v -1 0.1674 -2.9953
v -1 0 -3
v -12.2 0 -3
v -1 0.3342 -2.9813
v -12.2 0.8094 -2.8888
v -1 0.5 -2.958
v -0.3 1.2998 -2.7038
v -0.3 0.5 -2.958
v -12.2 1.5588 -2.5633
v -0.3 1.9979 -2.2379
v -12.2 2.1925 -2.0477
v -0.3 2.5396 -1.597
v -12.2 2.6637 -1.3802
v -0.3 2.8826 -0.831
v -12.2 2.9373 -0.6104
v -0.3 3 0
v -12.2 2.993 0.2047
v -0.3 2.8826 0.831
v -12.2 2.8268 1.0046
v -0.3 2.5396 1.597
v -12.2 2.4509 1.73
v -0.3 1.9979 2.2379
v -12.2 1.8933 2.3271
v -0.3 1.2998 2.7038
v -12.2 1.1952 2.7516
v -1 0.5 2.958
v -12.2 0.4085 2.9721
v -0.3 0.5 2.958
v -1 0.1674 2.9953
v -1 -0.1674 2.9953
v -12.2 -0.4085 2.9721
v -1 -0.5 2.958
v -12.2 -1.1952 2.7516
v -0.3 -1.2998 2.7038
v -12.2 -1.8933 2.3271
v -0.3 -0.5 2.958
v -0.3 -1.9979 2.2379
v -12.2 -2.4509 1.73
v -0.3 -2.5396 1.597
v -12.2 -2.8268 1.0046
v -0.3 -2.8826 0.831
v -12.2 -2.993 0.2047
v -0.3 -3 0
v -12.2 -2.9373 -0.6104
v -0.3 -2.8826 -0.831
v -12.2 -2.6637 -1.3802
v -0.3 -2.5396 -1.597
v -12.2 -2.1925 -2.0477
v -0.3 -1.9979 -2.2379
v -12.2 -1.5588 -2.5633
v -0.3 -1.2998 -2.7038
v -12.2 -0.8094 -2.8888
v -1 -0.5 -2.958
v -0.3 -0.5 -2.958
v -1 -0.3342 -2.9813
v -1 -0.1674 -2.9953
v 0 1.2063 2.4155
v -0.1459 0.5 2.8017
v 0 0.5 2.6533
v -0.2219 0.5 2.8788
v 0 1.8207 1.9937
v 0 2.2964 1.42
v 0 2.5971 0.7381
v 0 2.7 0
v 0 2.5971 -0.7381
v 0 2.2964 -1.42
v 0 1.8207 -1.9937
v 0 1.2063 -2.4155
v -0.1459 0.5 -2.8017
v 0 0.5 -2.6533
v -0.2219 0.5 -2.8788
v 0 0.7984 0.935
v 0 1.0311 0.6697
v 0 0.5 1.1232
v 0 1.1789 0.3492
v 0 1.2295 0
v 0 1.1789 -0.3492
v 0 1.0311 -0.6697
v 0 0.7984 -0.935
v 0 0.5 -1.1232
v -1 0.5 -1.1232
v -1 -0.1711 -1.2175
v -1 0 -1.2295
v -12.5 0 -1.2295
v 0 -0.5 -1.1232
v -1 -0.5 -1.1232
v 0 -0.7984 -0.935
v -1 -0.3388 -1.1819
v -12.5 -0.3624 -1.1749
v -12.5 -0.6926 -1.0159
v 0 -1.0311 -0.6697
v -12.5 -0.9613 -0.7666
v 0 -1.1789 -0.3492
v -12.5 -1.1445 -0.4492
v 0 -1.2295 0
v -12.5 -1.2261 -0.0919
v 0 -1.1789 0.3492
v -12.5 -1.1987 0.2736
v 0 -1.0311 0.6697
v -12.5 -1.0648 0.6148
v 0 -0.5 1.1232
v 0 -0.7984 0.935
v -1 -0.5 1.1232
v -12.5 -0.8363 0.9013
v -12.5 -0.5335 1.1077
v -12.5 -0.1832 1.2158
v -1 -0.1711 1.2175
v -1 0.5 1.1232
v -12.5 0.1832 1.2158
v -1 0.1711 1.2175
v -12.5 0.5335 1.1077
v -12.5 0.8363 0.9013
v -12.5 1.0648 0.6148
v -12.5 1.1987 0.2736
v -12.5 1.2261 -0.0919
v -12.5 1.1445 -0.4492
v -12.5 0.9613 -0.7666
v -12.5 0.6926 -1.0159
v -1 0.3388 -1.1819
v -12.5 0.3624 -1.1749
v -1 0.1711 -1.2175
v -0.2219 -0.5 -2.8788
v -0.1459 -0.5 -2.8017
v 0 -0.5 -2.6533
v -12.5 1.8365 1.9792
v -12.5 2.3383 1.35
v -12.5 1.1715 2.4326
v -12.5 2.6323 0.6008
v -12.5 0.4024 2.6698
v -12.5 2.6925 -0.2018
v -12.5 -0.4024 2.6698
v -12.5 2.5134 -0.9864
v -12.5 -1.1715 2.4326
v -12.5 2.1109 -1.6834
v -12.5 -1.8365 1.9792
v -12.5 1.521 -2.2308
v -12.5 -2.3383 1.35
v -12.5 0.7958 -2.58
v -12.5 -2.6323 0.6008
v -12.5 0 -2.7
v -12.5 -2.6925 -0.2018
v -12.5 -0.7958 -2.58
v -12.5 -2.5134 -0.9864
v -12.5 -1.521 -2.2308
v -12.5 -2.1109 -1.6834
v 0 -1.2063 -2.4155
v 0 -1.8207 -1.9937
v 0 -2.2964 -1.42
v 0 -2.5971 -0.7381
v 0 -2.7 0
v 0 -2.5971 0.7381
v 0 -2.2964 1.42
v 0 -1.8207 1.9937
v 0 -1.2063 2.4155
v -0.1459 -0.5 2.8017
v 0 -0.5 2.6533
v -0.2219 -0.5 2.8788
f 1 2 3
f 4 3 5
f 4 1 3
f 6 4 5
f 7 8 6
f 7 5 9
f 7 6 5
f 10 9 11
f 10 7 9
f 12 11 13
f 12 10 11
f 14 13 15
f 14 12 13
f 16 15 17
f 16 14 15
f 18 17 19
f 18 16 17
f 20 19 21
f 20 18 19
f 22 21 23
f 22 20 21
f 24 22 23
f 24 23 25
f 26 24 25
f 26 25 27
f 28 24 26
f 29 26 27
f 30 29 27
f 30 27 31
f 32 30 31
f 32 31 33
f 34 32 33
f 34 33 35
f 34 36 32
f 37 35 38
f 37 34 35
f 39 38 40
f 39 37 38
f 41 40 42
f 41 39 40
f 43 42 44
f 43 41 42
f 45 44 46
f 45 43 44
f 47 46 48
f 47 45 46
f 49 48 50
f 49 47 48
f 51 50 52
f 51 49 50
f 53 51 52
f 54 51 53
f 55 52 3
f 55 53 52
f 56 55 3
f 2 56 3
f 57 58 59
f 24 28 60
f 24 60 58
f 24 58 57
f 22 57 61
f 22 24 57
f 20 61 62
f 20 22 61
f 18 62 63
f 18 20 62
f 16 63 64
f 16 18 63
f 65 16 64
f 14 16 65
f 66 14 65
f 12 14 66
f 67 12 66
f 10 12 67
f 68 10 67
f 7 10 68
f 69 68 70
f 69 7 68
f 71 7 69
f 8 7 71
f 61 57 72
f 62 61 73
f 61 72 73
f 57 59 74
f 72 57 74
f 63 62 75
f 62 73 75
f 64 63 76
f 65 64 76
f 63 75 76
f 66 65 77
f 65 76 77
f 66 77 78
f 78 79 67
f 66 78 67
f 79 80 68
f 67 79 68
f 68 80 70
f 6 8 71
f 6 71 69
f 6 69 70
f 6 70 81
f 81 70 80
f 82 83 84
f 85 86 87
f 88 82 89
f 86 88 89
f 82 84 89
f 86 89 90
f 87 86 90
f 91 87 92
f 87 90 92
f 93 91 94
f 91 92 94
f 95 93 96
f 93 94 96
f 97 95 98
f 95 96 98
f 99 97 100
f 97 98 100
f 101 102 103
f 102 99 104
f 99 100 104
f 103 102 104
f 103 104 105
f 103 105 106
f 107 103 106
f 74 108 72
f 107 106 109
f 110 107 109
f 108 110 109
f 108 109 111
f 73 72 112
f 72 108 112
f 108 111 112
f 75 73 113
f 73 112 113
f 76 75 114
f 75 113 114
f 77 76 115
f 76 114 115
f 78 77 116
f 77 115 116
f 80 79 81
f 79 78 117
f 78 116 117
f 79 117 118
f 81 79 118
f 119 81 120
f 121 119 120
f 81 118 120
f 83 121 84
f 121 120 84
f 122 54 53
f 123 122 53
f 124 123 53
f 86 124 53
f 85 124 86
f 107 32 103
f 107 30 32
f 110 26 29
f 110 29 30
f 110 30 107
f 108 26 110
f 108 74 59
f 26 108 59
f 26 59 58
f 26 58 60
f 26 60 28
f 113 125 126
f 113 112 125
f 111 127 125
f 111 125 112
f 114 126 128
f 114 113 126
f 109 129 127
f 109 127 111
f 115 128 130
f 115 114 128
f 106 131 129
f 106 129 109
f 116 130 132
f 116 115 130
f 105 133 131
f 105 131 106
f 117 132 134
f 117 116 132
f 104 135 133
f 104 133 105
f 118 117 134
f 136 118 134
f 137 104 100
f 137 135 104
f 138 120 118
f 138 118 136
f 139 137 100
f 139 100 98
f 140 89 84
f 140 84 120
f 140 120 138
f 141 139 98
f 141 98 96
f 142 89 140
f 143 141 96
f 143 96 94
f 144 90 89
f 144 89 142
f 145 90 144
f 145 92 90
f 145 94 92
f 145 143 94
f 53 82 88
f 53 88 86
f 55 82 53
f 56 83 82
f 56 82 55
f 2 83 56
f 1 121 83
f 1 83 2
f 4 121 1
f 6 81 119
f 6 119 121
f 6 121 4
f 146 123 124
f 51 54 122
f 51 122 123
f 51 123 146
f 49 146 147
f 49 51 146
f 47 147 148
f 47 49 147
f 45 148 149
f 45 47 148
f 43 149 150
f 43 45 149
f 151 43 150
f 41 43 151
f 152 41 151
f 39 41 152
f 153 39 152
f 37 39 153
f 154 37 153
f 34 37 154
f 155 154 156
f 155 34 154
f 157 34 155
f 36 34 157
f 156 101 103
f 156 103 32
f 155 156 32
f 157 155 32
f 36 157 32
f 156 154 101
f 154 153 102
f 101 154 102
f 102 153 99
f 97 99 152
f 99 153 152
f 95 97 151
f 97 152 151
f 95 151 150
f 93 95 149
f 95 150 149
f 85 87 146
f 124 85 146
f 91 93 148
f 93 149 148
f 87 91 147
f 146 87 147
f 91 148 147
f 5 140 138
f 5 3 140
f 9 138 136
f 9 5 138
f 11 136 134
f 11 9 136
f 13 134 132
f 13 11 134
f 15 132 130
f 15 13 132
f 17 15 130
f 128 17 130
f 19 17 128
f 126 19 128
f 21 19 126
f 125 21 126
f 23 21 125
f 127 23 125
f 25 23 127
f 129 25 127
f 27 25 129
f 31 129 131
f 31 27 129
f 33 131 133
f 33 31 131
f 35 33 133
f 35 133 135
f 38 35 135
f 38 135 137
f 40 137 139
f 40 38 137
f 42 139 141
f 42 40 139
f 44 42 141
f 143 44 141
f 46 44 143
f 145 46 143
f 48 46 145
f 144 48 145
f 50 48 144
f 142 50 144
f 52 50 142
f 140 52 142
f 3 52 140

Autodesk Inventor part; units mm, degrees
ref_plane "YZ Plane" through (0, 0, 0) normal (1, 0, 0) x (0, 1, 0)
ref_plane "XZ Plane" through (0, 0, 0) normal (0, 1, 0) x (-1, 0, 0)
ref_plane "XY Plane" through (0, 0, 0) normal (0, 0, 1) x (1, 0, 0)
sketch "スケッチ1" plane through (0, 0, 0) normal (0, 1, 0) x (-1, 0, 0)
  line L0 (0, 0) -> (12.5, 0)
  line L1 (12.5, 0) -> (12.5, -3)
  line L2 (12.5, -3) -> (0, -3)
  line L3 (0, -3) -> (0, 0)
  dimension "d0" = 12.5
  dimension "d1" = 3
revolve "回転1" add sketch "スケッチ1" angle 360 about axis through (0, 0, 0) along (-1, 0, 0)
sketch "スケッチ2" plane through (0, 0, 0) normal (1, 0, 0) x (0, 0, -1)
  point P0 (0, 0)
  point P1 (0, 0)
hole "穴1" at (0, 0, 0) direction (-1, 0, 0) diameter 2.459 end through all thread size "M3x0.5" class "6H" standard "ANSI Metric M Profile"
sketch "スケッチ3" plane through (0, 0, 0) normal (1, 0, 0) x (0, 0, -1)
  circle A0 centre (0, 0) radius 3 projected
  line L0 (3, 0) -> (-3, 0)
  line L1 (3, -0.5) -> (-3, -0.5)
  line L2 (3, 0.5) -> (-3, 0.5)
  line L3 (3, 0.5) -> (3, -0.5)
  line L4 (-3, 0.5) -> (-3, -0.5)
  point P0 (-2.958, -0.5)
  point P1 (2.958, -0.5)
  point P2 (2.958, 0.5)
  point P3 (-2.958, 0.5)
  dimension "d10" = 0.5
extrude "押し出し1" cut sketch "スケッチ3" against normal blind 1 contours L0 A0 L2 | A0 L1 L0
chamfer "面取り1" distance 0.3 angle 45 3 edges at (-12.5, 0, 3) (0, 3, 0) (0, -3, 0)
properties part number "BRU-312.5S"
